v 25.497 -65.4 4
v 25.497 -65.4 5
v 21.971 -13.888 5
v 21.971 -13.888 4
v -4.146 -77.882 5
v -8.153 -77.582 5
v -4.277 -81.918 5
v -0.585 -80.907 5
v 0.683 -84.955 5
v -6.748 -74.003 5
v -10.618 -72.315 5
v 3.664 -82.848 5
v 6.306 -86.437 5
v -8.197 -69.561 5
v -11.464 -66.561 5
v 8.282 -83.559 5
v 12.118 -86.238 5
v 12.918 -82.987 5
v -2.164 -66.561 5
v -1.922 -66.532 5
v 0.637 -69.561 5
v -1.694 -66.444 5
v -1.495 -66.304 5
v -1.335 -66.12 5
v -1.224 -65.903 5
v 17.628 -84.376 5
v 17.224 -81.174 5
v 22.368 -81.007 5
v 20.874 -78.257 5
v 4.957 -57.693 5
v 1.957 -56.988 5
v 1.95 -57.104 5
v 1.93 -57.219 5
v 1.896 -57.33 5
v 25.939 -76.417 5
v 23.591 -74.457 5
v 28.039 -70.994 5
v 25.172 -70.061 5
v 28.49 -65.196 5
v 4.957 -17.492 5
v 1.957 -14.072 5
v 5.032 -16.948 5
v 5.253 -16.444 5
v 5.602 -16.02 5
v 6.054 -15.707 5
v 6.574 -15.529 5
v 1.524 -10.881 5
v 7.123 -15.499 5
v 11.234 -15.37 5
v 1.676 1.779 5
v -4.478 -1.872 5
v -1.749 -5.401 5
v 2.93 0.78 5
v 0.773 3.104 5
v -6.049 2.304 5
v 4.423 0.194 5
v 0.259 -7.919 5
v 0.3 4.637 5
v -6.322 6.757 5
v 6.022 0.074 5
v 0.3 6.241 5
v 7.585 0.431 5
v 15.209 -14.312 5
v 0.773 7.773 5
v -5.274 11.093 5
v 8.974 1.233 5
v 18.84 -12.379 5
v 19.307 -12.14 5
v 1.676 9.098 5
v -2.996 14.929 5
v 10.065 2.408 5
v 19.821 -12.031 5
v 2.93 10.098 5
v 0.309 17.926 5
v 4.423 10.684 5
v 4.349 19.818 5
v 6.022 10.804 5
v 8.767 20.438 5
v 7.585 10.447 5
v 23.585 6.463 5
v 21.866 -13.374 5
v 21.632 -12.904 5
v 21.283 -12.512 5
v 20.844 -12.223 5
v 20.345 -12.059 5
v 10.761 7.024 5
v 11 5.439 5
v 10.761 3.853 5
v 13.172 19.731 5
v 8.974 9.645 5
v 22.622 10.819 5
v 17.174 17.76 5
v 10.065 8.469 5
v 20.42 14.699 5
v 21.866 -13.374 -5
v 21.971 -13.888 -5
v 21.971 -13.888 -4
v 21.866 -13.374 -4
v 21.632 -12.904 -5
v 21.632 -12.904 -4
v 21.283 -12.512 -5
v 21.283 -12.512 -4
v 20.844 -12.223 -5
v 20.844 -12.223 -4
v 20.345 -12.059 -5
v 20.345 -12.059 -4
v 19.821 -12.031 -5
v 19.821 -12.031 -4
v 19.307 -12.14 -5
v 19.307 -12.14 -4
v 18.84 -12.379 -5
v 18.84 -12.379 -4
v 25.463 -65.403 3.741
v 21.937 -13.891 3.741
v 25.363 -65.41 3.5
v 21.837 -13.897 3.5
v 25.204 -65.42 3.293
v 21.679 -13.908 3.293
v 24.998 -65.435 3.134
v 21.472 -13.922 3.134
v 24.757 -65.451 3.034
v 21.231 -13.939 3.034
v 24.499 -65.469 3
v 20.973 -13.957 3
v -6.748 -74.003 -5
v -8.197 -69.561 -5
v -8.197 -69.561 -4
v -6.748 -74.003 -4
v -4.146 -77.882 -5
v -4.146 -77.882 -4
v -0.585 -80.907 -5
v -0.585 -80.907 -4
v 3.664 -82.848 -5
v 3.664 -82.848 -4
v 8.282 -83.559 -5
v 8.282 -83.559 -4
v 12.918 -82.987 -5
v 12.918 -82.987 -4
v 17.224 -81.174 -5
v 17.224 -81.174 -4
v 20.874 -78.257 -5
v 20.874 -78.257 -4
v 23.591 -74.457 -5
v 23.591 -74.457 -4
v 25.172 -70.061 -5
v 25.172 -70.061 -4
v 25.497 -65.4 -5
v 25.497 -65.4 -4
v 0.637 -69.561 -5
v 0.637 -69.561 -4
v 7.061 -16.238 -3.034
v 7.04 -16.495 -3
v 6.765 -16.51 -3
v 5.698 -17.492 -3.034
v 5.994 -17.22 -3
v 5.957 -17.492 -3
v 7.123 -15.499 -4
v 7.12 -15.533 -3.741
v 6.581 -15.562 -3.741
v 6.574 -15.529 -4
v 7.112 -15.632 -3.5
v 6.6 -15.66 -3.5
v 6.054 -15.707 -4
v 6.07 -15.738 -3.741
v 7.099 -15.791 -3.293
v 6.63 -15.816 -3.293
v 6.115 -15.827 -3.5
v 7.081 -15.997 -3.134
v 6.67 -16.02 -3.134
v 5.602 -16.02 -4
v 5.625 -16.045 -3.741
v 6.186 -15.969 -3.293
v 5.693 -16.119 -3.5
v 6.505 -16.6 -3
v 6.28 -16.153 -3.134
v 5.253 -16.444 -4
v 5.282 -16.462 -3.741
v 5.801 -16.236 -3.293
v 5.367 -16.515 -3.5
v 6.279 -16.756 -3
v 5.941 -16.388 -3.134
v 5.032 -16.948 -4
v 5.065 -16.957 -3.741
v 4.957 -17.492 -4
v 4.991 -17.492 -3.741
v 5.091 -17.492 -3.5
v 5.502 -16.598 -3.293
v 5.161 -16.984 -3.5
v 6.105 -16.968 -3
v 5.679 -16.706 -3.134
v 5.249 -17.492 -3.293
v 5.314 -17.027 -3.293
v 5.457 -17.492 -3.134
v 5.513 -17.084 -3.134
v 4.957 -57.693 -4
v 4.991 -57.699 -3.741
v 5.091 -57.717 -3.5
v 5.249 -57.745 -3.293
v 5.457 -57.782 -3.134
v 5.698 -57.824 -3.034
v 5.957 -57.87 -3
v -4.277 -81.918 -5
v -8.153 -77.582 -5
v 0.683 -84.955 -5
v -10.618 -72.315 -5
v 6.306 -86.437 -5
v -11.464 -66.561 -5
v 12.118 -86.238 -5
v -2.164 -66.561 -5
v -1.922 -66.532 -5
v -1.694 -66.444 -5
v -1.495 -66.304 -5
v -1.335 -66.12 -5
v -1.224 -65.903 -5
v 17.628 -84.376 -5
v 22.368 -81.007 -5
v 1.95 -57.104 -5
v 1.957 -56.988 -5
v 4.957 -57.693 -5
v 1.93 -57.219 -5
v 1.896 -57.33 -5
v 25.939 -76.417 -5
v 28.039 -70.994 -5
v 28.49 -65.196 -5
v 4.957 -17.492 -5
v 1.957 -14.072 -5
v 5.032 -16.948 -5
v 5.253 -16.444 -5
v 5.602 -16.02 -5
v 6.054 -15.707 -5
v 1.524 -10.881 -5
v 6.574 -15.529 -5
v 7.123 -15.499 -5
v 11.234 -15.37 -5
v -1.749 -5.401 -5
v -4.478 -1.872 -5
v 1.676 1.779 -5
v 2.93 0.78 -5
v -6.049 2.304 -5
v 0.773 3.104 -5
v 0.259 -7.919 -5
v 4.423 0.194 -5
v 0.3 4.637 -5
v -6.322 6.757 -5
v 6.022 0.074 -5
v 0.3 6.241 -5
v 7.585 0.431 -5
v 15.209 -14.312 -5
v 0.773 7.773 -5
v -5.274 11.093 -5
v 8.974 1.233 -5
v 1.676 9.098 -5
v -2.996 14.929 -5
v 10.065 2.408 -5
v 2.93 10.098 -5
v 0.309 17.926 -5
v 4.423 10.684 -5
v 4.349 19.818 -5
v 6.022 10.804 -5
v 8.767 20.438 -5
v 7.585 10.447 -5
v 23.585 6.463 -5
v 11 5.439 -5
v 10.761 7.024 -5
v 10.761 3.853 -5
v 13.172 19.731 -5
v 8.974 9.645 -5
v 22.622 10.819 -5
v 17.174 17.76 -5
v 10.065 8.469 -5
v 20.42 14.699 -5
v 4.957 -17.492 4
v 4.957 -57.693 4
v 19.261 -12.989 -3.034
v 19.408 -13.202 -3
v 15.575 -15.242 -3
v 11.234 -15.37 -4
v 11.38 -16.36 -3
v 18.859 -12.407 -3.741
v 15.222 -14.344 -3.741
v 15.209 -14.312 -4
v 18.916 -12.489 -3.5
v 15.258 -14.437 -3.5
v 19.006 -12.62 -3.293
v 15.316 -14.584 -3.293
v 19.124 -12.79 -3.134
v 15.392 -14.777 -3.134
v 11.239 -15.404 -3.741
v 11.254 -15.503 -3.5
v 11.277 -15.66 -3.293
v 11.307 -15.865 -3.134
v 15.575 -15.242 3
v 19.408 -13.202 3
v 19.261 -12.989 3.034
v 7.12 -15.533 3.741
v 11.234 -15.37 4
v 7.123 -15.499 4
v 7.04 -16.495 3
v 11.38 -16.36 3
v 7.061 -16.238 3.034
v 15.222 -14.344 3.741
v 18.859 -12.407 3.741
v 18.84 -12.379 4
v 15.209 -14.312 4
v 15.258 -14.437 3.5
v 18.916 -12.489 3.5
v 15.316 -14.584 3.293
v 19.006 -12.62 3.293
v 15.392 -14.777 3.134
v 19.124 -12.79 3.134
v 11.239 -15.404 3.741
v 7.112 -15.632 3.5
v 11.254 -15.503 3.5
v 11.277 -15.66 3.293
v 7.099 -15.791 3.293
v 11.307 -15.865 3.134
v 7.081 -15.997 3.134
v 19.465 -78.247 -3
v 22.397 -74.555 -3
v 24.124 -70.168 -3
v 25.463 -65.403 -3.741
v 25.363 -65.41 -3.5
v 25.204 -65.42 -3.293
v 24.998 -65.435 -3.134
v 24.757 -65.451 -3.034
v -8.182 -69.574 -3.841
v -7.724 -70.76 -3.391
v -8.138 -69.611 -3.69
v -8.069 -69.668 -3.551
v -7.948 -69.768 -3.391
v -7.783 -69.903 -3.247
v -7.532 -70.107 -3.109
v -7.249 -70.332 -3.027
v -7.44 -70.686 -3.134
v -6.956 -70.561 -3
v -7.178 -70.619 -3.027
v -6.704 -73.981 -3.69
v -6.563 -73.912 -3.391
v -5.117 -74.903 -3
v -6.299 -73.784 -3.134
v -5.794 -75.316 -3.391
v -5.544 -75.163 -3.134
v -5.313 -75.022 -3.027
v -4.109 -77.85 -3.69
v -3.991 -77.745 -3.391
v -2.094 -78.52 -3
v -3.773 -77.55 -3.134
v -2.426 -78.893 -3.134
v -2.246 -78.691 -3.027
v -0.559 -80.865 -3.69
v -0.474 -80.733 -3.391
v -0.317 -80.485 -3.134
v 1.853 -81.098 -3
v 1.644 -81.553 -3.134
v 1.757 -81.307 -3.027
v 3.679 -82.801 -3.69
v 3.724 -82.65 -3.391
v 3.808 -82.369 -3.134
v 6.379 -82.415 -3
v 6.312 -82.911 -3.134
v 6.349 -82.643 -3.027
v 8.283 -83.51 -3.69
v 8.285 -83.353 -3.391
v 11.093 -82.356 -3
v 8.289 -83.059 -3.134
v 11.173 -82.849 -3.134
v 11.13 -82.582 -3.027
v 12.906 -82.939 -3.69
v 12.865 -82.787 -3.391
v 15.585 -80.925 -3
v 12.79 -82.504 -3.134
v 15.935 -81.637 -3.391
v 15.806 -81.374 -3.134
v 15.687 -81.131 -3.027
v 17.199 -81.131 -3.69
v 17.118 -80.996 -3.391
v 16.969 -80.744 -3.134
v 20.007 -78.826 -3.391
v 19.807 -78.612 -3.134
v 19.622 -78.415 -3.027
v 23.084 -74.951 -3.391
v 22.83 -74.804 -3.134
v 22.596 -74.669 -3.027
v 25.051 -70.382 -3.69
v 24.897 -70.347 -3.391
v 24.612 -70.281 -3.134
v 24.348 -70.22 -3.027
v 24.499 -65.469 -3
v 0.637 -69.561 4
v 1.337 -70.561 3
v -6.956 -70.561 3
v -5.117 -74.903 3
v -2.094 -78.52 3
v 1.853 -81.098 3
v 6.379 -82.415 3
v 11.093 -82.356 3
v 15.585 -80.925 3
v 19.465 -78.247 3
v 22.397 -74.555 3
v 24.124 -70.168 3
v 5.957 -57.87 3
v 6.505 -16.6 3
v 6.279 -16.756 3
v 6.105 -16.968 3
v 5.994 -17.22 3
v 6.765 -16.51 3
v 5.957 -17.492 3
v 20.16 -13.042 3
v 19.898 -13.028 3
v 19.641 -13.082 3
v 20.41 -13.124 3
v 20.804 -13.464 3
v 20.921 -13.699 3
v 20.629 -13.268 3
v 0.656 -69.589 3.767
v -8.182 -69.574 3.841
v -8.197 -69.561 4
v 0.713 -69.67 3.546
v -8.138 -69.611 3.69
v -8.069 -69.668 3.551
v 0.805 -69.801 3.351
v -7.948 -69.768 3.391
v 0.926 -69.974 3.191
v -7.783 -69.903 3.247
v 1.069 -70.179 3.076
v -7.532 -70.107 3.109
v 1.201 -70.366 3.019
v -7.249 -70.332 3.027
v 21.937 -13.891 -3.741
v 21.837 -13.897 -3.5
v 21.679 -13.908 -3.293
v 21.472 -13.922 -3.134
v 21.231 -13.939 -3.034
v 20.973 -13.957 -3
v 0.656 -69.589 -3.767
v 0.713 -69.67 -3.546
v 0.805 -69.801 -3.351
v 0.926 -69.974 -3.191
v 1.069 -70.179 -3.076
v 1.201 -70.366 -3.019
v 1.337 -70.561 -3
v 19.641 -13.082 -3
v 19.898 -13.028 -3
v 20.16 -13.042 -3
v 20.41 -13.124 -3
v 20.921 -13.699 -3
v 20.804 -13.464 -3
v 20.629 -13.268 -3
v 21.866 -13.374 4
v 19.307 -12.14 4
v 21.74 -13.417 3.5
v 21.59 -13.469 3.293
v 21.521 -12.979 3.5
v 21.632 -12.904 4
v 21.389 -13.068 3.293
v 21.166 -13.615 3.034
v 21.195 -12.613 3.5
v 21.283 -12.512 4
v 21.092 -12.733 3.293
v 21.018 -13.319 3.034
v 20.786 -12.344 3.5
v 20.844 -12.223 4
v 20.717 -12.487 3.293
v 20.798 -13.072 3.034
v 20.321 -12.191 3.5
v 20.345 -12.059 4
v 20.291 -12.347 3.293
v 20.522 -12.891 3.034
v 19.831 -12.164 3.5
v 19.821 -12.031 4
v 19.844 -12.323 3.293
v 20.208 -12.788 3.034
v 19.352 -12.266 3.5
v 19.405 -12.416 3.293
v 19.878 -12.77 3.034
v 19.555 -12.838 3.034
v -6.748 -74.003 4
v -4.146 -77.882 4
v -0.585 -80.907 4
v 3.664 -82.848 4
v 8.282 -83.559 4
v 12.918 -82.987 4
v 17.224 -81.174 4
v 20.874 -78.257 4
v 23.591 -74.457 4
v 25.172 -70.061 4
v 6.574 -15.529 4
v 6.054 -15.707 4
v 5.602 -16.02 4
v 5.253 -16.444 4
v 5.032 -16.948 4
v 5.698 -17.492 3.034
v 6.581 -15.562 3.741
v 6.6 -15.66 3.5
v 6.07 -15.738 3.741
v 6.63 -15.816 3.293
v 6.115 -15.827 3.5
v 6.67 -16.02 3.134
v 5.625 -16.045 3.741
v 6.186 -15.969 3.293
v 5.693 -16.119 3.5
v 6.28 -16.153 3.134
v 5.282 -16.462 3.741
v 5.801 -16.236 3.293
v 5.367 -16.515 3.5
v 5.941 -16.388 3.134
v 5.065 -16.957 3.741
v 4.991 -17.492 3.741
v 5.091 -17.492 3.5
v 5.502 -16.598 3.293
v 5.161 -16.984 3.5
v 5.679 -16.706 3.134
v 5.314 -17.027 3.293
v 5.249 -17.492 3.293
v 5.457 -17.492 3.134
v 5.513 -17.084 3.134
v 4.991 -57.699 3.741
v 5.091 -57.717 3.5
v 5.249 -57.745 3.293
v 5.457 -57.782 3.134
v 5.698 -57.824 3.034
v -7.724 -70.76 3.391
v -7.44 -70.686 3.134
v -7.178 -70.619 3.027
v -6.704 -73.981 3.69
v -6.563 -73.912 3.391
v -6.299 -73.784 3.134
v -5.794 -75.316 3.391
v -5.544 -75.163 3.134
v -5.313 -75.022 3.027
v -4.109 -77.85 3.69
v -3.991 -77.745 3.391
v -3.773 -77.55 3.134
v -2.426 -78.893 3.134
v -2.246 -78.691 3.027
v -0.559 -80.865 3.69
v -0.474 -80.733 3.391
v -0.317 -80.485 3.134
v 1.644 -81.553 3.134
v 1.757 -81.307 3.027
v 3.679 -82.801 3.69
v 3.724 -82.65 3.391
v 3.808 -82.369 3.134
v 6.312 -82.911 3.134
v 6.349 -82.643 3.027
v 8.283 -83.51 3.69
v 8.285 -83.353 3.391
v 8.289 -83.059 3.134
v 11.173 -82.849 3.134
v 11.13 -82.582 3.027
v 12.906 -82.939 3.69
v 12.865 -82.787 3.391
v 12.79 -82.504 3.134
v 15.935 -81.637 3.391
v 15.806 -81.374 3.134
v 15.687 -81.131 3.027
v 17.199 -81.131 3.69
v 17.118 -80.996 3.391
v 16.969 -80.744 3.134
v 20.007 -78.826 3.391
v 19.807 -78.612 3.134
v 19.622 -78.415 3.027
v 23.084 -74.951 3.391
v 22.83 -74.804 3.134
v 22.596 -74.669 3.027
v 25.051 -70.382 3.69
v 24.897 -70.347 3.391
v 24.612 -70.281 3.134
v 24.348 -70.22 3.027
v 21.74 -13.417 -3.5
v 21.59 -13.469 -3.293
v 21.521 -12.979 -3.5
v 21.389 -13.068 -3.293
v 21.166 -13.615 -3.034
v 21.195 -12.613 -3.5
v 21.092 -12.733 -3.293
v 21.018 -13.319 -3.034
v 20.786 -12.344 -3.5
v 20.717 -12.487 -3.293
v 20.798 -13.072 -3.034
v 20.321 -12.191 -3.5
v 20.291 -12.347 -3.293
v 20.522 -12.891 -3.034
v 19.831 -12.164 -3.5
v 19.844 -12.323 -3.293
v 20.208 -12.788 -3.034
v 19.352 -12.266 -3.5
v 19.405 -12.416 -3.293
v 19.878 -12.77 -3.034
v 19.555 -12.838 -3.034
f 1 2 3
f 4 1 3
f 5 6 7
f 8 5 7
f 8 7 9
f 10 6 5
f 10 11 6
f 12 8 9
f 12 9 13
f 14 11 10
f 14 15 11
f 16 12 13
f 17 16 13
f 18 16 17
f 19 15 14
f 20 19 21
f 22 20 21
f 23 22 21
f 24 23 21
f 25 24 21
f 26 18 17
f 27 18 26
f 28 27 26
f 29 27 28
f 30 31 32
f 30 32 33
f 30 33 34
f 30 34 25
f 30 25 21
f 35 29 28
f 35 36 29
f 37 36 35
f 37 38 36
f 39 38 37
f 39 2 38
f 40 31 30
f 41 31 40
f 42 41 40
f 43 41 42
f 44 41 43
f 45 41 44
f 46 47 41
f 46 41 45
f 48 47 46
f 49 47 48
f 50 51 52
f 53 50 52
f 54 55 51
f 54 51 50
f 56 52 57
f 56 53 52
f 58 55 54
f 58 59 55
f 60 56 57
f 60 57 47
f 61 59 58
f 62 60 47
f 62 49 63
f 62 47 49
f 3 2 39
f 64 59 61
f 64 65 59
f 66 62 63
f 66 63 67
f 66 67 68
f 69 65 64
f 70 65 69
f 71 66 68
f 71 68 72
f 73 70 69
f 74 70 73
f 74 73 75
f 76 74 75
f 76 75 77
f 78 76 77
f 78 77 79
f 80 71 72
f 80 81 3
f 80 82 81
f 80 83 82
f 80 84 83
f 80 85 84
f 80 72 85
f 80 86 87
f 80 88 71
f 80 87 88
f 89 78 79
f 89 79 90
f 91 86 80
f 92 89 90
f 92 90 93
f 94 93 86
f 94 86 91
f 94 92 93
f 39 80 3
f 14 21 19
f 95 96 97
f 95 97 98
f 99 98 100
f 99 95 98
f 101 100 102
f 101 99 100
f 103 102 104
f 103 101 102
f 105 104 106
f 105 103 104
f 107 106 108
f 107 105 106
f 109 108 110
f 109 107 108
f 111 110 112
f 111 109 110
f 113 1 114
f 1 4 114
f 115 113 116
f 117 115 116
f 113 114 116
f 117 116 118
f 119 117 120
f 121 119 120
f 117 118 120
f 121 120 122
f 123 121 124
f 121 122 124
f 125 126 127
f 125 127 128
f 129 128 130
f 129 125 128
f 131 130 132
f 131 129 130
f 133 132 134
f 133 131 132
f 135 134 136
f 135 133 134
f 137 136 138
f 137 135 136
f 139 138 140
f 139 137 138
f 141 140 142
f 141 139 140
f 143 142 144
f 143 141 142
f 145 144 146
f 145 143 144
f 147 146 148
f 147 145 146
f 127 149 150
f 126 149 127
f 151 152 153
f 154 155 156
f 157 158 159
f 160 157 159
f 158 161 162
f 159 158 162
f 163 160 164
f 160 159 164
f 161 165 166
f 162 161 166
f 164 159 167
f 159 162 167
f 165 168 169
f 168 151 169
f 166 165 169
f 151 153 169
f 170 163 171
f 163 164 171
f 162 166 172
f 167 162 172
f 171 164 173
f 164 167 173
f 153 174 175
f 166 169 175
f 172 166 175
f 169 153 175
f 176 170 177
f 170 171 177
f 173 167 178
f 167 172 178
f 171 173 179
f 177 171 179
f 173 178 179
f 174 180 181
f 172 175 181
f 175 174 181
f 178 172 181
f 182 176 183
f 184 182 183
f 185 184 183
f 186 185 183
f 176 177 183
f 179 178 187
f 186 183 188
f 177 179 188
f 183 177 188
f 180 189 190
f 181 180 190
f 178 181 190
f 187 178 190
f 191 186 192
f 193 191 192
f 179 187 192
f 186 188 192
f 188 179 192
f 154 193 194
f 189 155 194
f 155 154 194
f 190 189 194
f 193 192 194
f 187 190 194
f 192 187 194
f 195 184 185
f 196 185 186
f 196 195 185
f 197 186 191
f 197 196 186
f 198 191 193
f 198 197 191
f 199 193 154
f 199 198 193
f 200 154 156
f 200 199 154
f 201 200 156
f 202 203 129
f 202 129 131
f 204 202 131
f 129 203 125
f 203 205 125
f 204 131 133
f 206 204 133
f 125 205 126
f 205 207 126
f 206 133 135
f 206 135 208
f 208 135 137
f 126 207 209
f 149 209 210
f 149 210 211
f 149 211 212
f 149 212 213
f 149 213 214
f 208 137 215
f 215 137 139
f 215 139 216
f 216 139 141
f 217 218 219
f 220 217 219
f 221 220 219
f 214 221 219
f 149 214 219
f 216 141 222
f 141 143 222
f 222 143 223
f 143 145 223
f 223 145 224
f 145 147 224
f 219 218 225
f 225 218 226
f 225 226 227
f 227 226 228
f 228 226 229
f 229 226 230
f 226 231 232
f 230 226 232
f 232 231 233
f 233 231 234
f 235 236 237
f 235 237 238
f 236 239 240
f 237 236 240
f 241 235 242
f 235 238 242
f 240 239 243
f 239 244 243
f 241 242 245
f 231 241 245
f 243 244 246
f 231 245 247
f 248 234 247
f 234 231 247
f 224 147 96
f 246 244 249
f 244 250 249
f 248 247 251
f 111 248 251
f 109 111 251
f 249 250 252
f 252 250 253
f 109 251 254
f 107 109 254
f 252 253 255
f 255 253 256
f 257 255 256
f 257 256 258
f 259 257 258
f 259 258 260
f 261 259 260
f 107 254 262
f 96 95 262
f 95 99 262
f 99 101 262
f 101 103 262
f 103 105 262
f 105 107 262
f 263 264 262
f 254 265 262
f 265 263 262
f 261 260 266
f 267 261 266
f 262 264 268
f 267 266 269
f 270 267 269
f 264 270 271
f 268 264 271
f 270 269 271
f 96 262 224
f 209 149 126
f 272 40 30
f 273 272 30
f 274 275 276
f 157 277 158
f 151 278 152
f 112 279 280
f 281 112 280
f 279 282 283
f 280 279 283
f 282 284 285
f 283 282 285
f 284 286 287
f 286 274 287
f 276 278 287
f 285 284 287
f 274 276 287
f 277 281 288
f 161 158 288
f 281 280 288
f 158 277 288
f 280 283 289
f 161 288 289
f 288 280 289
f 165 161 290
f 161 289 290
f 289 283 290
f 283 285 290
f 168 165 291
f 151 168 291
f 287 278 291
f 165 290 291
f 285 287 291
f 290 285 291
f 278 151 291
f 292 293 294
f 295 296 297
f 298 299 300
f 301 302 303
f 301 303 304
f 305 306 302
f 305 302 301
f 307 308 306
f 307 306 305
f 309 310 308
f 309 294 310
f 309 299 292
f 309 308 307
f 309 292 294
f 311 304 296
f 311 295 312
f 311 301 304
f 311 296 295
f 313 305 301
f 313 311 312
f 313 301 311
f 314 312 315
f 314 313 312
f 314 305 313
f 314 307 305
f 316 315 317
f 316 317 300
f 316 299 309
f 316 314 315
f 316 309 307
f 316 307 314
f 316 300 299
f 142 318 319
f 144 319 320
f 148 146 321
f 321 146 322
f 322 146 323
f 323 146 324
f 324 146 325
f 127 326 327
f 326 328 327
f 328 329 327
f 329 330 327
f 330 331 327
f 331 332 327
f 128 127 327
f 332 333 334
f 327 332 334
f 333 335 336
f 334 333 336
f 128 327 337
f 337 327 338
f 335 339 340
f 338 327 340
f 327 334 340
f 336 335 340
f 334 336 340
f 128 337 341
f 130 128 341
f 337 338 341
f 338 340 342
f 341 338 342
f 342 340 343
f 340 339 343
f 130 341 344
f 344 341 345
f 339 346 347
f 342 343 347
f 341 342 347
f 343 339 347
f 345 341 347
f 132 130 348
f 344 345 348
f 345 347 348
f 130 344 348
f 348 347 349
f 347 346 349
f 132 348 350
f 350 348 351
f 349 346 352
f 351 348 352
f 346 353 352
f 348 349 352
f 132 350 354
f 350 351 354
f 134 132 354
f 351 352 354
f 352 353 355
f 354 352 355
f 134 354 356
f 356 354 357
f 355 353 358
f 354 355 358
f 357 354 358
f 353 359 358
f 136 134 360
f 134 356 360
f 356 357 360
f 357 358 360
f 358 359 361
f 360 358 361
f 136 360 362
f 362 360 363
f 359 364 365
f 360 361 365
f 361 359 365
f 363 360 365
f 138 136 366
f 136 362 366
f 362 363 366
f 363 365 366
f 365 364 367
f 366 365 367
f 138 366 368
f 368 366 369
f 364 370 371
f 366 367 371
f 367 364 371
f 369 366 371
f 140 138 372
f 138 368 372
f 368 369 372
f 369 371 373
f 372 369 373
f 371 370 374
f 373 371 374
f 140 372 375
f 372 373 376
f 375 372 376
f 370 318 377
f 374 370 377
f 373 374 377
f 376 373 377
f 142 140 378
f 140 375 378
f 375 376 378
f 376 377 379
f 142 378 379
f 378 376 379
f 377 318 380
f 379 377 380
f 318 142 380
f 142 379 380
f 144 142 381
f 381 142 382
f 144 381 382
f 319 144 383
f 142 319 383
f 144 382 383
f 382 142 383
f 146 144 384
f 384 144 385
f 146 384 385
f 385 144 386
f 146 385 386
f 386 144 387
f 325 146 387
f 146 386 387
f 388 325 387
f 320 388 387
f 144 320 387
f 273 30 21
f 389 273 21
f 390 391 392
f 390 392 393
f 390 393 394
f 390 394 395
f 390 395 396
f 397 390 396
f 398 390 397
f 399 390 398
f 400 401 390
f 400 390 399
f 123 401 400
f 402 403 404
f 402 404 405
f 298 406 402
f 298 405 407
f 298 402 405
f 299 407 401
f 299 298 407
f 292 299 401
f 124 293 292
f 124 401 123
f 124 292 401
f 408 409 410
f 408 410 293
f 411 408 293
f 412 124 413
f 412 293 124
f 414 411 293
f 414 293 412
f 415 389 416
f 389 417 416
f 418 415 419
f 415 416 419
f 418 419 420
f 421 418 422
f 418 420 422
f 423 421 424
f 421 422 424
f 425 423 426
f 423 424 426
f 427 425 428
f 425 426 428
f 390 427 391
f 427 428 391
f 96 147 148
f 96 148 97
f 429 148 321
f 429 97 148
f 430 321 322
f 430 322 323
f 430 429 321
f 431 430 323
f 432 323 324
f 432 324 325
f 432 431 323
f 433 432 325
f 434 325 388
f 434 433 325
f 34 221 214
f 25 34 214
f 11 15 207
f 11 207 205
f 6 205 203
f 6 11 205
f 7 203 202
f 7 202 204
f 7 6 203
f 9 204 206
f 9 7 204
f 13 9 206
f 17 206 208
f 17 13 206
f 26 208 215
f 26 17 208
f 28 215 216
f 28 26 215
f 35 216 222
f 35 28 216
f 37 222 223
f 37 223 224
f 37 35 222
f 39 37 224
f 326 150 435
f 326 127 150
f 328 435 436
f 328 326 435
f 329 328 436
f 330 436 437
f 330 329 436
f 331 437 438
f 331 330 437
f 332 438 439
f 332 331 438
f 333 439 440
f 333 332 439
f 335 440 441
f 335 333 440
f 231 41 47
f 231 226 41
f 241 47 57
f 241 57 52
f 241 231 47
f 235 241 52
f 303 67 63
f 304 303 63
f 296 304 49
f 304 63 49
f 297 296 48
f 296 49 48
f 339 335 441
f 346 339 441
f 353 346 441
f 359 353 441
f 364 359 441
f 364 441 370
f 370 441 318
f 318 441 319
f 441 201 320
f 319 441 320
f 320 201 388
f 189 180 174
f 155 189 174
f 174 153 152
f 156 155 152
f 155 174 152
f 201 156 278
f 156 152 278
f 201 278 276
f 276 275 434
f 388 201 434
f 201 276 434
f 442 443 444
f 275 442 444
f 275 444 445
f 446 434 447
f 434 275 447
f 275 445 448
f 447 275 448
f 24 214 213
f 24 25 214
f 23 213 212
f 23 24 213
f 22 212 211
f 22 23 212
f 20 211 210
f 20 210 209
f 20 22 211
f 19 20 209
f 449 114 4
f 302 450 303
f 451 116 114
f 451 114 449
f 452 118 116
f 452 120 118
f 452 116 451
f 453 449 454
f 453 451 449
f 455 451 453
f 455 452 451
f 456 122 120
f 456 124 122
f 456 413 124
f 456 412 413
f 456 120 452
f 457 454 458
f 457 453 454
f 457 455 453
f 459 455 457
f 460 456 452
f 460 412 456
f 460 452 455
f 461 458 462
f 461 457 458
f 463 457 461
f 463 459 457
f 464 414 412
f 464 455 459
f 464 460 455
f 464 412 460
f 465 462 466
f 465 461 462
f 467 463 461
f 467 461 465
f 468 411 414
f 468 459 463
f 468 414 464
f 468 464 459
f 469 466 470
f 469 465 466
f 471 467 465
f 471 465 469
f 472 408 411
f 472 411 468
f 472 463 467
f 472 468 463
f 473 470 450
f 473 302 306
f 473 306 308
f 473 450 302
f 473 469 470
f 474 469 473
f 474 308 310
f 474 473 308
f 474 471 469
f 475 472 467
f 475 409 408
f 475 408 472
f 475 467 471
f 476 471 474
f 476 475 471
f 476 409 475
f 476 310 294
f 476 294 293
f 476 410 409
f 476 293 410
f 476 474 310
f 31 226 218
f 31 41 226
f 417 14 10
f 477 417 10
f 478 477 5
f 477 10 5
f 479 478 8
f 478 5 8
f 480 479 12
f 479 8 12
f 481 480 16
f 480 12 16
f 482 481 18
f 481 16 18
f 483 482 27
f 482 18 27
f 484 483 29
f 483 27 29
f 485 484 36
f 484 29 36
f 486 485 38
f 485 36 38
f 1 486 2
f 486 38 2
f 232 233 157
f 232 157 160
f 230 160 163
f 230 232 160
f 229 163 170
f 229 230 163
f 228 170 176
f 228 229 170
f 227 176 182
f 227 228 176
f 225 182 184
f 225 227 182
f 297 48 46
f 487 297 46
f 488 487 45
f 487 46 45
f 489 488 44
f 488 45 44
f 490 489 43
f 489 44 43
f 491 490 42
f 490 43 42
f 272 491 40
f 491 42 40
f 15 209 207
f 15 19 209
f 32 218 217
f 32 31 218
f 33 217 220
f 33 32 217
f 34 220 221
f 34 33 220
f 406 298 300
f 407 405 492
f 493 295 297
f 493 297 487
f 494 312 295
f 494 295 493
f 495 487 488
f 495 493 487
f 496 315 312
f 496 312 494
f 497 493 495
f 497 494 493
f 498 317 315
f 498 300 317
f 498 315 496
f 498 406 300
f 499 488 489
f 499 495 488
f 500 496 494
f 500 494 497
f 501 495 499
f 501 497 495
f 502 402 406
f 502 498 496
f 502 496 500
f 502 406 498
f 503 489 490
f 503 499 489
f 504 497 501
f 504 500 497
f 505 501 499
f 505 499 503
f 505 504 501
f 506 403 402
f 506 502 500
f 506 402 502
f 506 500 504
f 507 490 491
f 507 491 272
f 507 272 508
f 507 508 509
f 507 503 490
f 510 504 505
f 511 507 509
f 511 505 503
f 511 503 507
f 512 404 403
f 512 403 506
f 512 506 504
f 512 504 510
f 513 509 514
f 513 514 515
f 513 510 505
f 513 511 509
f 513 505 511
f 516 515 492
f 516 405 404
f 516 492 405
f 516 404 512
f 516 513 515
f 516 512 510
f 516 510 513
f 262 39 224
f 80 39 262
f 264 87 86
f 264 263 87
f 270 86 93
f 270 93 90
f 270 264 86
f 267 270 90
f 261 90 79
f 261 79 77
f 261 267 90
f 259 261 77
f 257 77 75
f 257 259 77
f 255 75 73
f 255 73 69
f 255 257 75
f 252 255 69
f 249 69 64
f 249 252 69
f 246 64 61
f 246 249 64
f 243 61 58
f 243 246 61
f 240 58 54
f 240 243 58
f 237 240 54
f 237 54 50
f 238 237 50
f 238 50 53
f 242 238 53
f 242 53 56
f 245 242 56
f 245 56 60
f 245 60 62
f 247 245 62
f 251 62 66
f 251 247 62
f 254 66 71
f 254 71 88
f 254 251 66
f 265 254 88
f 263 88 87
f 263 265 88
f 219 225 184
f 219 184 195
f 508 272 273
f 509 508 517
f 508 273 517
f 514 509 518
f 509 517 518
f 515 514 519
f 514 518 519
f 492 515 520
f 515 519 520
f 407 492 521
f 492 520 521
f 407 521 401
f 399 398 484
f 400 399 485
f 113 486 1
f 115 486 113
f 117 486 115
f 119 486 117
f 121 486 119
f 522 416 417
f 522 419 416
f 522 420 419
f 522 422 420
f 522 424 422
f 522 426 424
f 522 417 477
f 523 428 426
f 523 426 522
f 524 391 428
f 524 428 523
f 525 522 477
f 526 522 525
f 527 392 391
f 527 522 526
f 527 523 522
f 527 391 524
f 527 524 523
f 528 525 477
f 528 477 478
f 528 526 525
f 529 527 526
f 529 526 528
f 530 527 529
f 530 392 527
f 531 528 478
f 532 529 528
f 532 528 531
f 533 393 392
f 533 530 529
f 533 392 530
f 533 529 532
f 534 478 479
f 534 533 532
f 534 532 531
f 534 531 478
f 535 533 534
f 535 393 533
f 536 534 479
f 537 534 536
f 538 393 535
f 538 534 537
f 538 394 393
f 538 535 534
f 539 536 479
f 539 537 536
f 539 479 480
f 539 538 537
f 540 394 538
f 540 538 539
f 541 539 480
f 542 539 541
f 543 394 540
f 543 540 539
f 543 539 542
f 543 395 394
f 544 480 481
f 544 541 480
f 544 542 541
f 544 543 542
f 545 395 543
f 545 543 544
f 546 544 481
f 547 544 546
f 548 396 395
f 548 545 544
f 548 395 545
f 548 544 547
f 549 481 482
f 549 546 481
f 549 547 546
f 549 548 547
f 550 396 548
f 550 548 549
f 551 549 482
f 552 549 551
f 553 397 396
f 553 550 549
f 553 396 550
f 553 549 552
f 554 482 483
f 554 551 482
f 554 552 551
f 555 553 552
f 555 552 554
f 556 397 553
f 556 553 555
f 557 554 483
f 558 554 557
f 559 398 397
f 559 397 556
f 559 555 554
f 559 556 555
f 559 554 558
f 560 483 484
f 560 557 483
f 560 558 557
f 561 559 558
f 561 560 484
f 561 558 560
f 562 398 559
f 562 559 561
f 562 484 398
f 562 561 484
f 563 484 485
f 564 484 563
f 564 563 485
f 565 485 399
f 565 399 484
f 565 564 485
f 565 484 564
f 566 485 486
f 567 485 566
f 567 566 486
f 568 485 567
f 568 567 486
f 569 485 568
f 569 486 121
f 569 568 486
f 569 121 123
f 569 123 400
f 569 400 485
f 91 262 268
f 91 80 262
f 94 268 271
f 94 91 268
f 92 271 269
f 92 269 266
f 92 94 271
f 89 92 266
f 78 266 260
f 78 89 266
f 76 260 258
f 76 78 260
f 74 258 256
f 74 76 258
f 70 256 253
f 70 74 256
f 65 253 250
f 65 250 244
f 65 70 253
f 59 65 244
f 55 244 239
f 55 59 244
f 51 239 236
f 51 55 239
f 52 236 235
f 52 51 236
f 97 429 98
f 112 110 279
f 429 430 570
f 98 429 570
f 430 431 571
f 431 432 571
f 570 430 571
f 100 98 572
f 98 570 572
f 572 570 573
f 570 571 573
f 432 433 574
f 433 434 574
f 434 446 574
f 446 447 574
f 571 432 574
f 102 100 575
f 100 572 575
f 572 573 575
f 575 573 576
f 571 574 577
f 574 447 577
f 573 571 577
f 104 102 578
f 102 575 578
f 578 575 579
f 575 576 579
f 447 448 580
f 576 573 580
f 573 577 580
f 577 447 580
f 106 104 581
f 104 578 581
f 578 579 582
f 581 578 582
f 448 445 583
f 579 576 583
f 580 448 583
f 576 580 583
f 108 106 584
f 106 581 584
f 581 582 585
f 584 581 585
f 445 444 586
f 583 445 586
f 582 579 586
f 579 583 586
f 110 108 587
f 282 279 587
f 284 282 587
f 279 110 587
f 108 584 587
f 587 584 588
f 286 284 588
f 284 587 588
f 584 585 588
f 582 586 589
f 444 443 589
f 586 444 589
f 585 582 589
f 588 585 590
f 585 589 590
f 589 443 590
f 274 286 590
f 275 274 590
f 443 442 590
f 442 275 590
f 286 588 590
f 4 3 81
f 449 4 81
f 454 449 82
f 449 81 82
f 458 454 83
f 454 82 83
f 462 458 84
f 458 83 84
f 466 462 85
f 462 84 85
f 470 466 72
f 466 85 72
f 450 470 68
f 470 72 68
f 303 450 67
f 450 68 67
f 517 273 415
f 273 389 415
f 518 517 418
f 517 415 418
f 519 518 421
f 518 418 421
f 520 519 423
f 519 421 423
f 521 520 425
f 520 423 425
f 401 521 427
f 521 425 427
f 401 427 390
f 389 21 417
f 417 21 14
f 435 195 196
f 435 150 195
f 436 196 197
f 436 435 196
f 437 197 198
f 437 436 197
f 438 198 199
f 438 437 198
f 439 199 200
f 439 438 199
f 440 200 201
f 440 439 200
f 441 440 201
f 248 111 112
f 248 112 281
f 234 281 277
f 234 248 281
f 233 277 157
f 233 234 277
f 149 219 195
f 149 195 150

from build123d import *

# Parameters (mm, degrees)
SKETCH2_R           = 5.379907511
BOSS_EXTRUDE1_DEPTH = 5
CUT_EXTRUDE1_DEPTH  = 2
FILLET1_R           = 1
FILLET2_R           = 12


with BuildPart() as part:
    # Sketch2 → Boss-Extrude1 (new body, symmetric)
    with BuildSketch(Plane.XY):
        with BuildLine():
            Line((1.956537451, -8.000102101), (1.956537451, -57.164379656))
            Line((1.956537451, -57.164379656), (-1.463663982, -66.561305864))
            Line((-1.463663982, -66.561305864), (-11.463663982, -66.561305864))
            ThreePointArc((-11.463663982, -66.561305864), (9.219617422, -86.549630619), (28.48964867, -65.195540804))
            Line((28.48964867, -65.195540804), (23.58476107, 6.463017931))
            ThreePointArc((23.58476107, 6.463017931), (0.281599066, 17.907647409), (1.956537451, -8.000102101))
        make_face()
        with Locations((5.619776581, 5.438694136)):
            Circle(SKETCH2_R, mode=Mode.SUBTRACT)
    extrude(amount=BOSS_EXTRUDE1_DEPTH, both=True)

    # Sketch5 → Cut-Extrude1 (cut)
    with BuildSketch(Plane.XY.offset(5)):
        with BuildLine():
            Line((4.956537451, -17.492026764), (4.956537451, -57.693360598))
            Line((4.956537451, -57.693360598), (0.636958632, -69.561305864))
            Line((0.636958632, -69.561305864), (-8.196864513, -69.561305864))
            ThreePointArc((-8.196864513, -69.561305864), (10.619883032, -83.433141325), (25.496651772, -65.400405563))
            Line((25.496651772, -65.400405563), (21.970749815, -13.888307203))
            ThreePointArc((21.970749815, -13.888307203), (20.844130084, -12.223400912), (18.839854353, -12.378525925))
            ThreePointArc((18.839854353, -12.378525925), (13.252017954, -14.955050138), (7.122861364, -15.498954674))
            ThreePointArc((7.122861364, -15.498954674), (5.602404486, -16.020183052), (4.956537451, -17.492026764))
        make_face()
    cut_extrude1 = extrude(amount=-CUT_EXTRUDE1_DEPTH, mode=Mode.SUBTRACT)

    # Mirror1: Cut-Extrude1 across plane
    add(cut_extrude1.mirror(Plane.XY), mode=Mode.SUBTRACT)

    # Fillet1
    fillet1_edges = [part.edges().sort_by_distance(p)[0] for p in [
        (1.956537451, -57.164379656, 0),
        (-1.463663982, -66.561305864, 0),
        (13.252017954, -14.955050138, 3),
        (20.844130084, -12.223400912, 3),
        (23.733700794, -39.644356383, 3),
        (10.619883032, -83.433141325, 3),
        (-3.77995294, -69.561305864, 3),
        (2.796748042, -63.627333231, 3),
        (4.956537451, -37.592693681, 3),
        (5.602404486, -16.020183052, 3),
        (13.252017954, -14.955050138, -3),
        (5.602404486, -16.020183052, -3),
        (4.956537451, -37.592693681, -3),
        (2.796748042, -63.627333231, -3),
        (-3.77995294, -69.561305864, -3),
        (10.619883032, -83.433141325, -3),
        (23.733700794, -39.644356383, -3),
        (20.844130084, -12.223400912, -3),
    ]]
    fillet(fillet1_edges, radius=FILLET1_R)

    # Fillet2
    fillet2_edges = [part.edges().sort_by_distance(p)[0] for p in [
        (1.956537451, -8.000102101, 0),
    ]]
    fillet(fillet2_edges, radius=FILLET2_R)


solid = part.part
